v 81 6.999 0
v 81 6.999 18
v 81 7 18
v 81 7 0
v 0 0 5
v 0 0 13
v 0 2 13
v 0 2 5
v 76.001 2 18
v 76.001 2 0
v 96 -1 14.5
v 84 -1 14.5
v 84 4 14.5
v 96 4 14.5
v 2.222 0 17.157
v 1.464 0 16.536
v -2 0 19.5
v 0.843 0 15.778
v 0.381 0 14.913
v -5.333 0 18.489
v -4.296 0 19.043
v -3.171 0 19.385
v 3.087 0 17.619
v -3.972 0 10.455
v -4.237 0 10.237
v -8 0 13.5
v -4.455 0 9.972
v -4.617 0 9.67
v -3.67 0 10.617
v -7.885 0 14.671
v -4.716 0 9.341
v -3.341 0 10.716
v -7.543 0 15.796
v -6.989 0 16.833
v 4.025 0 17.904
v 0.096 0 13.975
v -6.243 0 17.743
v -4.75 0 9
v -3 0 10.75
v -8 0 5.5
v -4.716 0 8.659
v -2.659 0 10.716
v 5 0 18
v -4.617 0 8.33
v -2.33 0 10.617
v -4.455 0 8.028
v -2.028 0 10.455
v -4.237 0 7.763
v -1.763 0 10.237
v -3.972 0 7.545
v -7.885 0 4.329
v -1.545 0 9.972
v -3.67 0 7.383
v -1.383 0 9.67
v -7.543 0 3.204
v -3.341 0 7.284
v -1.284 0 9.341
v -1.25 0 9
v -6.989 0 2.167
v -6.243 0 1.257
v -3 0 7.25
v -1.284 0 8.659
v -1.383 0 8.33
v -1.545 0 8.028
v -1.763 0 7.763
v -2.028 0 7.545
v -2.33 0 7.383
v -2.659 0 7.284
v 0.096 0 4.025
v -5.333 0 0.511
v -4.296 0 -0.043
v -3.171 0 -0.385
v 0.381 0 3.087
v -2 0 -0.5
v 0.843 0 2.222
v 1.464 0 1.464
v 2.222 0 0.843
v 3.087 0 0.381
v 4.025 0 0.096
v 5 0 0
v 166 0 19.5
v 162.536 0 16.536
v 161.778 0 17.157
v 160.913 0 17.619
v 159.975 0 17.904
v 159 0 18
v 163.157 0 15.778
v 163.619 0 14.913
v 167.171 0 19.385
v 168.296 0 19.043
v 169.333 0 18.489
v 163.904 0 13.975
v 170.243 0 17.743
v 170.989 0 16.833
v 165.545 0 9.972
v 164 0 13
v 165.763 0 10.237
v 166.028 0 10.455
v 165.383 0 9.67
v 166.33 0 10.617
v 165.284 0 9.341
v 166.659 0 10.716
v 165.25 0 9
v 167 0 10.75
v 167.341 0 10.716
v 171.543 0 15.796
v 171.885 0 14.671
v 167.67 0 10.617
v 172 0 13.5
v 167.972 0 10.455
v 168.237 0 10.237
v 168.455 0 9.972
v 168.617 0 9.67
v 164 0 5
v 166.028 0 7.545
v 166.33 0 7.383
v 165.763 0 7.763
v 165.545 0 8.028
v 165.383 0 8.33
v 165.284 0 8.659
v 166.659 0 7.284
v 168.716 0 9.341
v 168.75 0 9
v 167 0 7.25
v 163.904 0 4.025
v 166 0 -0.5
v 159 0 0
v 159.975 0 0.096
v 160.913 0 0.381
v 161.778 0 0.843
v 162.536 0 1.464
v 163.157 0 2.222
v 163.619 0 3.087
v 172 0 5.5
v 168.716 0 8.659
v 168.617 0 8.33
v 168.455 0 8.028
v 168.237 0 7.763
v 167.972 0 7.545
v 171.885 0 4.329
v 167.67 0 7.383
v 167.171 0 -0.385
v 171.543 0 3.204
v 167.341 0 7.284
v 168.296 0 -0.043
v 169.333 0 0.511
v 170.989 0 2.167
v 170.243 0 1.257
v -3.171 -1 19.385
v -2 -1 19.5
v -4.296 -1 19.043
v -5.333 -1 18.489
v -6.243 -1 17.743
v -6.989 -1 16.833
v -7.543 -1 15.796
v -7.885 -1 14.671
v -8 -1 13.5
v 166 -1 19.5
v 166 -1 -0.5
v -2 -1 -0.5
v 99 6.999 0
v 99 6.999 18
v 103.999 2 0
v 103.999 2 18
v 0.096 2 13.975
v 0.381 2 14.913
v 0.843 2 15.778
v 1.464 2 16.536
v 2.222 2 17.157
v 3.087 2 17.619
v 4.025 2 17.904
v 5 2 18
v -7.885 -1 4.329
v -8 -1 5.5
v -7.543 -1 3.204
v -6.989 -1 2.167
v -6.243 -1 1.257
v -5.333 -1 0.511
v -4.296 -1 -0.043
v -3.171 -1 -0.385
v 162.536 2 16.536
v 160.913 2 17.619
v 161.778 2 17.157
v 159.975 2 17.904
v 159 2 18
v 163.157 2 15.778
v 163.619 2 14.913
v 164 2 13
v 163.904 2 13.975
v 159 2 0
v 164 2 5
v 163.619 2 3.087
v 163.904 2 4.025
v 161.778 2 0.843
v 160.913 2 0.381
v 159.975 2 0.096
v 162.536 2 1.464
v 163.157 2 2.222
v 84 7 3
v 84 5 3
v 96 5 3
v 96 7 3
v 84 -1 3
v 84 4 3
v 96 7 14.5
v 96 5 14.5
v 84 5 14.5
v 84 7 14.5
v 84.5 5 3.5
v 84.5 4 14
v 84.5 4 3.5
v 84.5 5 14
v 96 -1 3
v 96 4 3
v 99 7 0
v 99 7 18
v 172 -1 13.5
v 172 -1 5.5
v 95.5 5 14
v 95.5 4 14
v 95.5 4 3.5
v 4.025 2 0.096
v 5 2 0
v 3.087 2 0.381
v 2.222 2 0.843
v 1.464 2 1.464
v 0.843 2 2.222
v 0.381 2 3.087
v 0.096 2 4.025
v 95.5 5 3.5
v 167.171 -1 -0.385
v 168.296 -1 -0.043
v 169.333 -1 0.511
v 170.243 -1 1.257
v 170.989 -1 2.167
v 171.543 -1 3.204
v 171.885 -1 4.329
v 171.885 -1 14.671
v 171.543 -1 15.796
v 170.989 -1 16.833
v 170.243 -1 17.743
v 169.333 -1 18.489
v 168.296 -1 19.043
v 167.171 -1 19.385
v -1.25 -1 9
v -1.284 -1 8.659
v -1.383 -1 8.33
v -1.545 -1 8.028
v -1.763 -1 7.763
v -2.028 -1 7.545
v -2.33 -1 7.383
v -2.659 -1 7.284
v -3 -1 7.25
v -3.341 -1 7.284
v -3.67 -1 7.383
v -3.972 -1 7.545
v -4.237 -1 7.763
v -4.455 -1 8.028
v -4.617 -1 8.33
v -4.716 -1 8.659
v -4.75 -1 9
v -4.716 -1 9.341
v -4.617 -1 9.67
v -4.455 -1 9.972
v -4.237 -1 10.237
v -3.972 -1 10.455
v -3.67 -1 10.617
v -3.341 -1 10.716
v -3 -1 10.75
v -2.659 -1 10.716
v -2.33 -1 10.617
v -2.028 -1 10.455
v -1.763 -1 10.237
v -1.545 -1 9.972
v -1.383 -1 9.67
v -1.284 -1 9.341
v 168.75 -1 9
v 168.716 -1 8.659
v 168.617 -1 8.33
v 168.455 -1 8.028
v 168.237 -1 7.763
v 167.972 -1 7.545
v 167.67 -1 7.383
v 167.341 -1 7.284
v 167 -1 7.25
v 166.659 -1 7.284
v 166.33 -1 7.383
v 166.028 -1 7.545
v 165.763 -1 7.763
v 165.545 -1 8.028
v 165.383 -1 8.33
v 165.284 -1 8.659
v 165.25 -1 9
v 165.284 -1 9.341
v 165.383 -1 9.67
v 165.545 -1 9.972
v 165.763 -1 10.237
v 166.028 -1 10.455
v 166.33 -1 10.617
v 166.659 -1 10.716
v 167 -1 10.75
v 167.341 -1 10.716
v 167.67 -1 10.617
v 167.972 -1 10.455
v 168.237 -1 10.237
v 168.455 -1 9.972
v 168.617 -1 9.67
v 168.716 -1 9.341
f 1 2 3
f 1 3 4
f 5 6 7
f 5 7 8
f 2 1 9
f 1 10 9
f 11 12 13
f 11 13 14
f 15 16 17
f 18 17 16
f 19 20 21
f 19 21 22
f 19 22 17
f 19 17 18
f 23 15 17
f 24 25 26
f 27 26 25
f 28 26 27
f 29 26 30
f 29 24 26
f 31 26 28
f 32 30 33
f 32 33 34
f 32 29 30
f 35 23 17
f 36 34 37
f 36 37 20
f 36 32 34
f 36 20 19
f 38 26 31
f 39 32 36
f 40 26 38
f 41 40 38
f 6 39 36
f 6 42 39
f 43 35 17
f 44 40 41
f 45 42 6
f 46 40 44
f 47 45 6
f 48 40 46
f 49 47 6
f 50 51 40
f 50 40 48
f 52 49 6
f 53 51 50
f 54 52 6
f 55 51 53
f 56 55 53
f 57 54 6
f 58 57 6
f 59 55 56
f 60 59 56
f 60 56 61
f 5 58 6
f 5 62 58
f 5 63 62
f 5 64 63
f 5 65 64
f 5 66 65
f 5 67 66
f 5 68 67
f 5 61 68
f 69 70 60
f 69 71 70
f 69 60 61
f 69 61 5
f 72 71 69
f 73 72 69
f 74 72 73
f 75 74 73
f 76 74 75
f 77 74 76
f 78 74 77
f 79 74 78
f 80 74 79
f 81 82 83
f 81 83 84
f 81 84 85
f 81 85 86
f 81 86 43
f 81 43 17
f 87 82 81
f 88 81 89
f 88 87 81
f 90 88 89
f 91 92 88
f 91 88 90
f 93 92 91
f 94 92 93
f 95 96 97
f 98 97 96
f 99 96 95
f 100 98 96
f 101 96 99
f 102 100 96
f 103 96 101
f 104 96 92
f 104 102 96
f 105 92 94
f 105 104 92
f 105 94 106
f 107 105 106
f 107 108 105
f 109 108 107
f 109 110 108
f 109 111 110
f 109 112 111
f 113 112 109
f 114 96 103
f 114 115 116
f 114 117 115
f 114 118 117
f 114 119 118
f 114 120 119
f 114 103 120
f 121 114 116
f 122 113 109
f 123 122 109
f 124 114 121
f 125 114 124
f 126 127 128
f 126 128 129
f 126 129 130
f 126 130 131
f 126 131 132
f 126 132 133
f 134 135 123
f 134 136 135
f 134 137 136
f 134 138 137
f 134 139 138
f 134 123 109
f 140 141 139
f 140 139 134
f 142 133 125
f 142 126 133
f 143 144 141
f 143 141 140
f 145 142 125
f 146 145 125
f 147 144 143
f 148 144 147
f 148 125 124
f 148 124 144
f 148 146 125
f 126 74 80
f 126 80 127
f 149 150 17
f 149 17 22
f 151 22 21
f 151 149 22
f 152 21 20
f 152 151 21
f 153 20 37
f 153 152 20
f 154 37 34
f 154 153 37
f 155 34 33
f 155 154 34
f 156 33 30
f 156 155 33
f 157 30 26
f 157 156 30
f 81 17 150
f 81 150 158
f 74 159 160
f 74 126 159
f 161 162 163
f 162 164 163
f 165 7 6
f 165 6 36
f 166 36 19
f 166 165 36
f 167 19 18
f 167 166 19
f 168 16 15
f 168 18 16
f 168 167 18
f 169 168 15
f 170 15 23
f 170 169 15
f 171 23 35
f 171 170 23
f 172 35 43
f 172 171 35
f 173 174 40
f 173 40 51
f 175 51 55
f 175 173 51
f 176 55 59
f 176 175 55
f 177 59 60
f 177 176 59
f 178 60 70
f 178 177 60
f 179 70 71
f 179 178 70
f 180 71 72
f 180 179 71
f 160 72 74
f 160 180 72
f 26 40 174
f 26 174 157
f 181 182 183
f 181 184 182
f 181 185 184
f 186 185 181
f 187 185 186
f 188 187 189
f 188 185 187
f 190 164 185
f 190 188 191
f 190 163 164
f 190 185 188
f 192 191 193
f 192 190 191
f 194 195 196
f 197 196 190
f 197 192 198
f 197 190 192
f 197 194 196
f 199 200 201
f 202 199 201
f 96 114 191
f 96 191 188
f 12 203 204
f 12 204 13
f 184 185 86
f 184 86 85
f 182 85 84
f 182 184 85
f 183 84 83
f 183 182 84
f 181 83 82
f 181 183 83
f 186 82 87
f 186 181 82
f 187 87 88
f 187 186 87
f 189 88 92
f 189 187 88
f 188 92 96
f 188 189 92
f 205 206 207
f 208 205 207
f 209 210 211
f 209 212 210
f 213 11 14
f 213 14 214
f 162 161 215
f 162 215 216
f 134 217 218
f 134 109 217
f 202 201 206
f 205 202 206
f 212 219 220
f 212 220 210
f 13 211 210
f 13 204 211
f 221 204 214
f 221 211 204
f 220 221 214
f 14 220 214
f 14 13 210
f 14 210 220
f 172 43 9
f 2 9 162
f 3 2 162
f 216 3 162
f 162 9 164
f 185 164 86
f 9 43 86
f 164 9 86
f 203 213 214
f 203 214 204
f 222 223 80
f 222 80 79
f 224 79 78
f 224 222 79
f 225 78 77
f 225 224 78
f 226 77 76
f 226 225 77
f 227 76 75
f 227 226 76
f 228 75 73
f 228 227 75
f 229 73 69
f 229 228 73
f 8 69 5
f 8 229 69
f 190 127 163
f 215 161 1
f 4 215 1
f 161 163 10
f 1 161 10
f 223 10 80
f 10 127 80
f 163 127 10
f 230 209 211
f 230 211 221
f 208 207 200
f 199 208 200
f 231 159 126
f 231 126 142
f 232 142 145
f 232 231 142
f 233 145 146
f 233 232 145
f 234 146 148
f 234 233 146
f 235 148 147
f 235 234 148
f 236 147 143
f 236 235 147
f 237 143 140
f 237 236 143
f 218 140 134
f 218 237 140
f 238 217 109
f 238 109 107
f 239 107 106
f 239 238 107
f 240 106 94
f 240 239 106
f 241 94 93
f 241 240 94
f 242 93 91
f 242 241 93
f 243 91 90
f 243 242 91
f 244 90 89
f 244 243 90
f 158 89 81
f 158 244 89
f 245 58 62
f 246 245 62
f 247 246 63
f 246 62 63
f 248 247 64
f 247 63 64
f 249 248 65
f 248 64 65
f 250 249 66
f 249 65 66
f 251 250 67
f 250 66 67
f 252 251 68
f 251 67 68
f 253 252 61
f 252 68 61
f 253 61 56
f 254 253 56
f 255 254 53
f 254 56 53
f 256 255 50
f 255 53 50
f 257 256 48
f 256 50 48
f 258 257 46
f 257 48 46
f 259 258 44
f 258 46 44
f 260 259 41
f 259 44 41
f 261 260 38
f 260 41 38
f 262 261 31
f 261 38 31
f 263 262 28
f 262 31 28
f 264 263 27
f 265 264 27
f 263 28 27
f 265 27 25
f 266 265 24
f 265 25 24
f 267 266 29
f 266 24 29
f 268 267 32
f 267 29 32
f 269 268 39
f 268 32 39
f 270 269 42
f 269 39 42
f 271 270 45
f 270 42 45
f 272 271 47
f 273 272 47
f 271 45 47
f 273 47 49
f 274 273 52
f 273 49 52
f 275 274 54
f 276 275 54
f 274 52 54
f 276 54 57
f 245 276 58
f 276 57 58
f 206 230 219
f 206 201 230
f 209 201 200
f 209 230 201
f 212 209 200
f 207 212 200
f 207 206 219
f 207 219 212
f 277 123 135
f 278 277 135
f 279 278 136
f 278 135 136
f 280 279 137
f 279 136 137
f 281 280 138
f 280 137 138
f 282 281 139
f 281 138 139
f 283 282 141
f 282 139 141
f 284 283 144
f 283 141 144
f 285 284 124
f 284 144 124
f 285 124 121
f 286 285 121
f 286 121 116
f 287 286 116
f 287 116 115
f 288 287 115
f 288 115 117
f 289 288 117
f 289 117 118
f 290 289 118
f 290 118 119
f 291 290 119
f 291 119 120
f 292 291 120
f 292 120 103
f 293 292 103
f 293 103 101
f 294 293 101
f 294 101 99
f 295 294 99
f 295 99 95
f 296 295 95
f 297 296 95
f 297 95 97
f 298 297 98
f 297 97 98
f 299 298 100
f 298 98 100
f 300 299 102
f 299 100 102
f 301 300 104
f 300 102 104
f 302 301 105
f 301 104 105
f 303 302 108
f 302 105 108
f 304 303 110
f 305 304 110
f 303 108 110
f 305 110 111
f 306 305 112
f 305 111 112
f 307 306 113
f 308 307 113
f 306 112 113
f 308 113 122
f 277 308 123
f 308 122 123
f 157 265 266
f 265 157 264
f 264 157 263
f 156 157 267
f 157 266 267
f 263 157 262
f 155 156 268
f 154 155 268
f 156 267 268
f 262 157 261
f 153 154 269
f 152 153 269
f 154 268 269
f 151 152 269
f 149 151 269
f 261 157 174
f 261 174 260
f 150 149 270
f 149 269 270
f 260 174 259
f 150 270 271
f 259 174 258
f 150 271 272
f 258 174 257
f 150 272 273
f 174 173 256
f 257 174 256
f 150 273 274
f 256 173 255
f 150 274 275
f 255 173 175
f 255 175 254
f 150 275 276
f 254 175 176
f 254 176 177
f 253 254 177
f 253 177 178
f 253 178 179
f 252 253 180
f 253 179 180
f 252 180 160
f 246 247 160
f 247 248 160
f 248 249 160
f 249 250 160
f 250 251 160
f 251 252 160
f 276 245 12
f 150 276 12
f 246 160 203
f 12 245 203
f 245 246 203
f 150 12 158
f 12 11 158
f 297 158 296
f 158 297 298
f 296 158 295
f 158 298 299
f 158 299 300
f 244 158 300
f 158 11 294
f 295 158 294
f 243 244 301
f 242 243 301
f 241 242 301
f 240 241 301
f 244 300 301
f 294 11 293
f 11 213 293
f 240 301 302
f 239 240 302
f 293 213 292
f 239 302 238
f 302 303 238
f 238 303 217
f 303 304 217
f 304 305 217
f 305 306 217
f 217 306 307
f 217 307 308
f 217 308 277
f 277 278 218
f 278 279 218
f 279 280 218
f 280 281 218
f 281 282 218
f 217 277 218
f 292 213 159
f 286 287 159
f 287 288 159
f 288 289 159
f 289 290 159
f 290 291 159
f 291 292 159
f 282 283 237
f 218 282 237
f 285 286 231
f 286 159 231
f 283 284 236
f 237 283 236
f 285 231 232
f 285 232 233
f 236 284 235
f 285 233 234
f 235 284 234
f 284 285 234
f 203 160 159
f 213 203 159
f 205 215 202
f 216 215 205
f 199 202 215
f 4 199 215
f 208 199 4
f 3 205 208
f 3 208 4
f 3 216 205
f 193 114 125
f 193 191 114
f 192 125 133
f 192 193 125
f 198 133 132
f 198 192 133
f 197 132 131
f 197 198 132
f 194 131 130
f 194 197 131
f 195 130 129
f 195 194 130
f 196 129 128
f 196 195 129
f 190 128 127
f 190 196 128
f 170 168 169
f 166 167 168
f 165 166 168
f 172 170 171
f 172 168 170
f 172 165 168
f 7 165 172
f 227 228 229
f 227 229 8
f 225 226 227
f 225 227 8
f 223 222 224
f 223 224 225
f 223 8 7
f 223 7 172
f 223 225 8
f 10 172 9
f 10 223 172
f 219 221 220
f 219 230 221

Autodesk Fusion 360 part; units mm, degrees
sketch "Skizze1" plane through (0, 0, 0) normal (0, 1, 0) x (1, 0, 0)
  line L0 (0, 0) -> (164, 0)
  line L1 (164, 0) -> (164, -18)
  line L2 (164, -18) -> (0, -18)
  line L3 (0, -18) -> (0, 0)
  dimension "d1" = 18
  dimension "d2" = 164
extrude "Extrusion1" add sketch "Skizze1" along normal blind 8
fillet "Abrundung1" radius 5 4 edges at (0, 4, 18) (164, 4, 18) (0, 4, 0) (164, 4, 0)
sketch "Skizze2" plane through (0, 0, 0) normal (0, 1, 0) x (1, 0, 0)
  line L0 (-8, -19.5) -> (172, -19.5)
  line L1 (172, -19.5) -> (172, 0.5)
  line L2 (172, 0.5) -> (-8, 0.5)
  line L3 (-8, 0.5) -> (-8, -19.5)
  line L4 (-8, -9) -> (172, -9) construction
  circle A0 centre (-3, -9) radius 1.75
  circle A1 centre (167, -9) radius 1.75
  point P0 (0, -13)
  point P1 (164, -13)
  dimension "d7" = 0.5
  dimension "d8" = 19.5
  dimension "d9" = 9
  dimension "d10" = 3
  dimension "d11" = 3
  dimension "d12" = 3.5
  dimension "d13" = 5
  dimension "d14" = 5
extrude "Extrusion2" add sketch "Skizze2" against normal blind 1
fillet "Abrundung2" radius 6 4 edges at (172, -0.5, 19.5) (172, -0.5, -0.5) (-8, -0.5, 19.5) (-8, -0.5, -0.5)
extrude "Extrusion3" cut 1 faces at (56.3333, 8, 12) along direction (0, -1, 0) blind 6
sketch "Skizze3" plane through (0, 2, 0) normal (0, 1, 0) x (-1, 0, 0)
  arc A0 (-164, 5) -> (-159, 0) centre (-159, 5) ccw
  line L0 (-159, 0) -> (-5, 0)
  arc A1 (-5, 0) -> (0, 5) centre (-5, 5) ccw
  line L1 (0, 5) -> (0, 13)
  arc A2 (0, 13) -> (-5, 18) centre (-5, 13) ccw
  line L2 (-5, 18) -> (-159, 18)
  arc A3 (-159, 18) -> (-164, 13) centre (-159, 13) ccw
  line L3 (-164, 13) -> (-164, 5)
  line L4 (-96, 14.5) -> (-84, 14.5)
  line L5 (-84, 14.5) -> (-84, 3)
  line L6 (-84, 3) -> (-96, 3)
  line L7 (-96, 3) -> (-96, 14.5)
  dimension "d21" = 68
  dimension "d22" = 3
  dimension "d23" = 3.5
  dimension "d24" = 12
extrude "Extrusion4" add sketch "Skizze3" along normal blind 3 contours L4 L5 L6 L7
sketch "Skizze4" plane through (0, 2, 0) normal (0, 1, 0) x (-1, 0, 0)
  line L0 (-96, 3) -> (-96, 14.5)
  line L1 (-96, 14.5) -> (-84, 14.5)
  line L2 (-84, 14.5) -> (-84, 3)
  line L3 (-84, 3) -> (-96, 3)
  arc A0 (-164, 5) -> (-159, 0) centre (-159, 5) ccw
  line L4 (-159, 0) -> (-5, 0)
  arc A1 (-5, 0) -> (0, 5) centre (-5, 5) ccw
  line L5 (0, 5) -> (0, 13)
  arc A2 (0, 13) -> (-5, 18) centre (-5, 13) ccw
  line L6 (-5, 18) -> (-159, 18)
  arc A3 (-159, 18) -> (-164, 13) centre (-159, 13) ccw
  line L7 (-164, 13) -> (-164, 5)
  line L8 (-99, 18) -> (-81, 18)
  line L9 (-81, 18) -> (-81, 0)
  line L10 (-81, 0) -> (-99, 0)
  line L11 (-99, 0) -> (-99, 18)
  dimension "d27" = 3.5
  dimension "d28" = 3
  dimension "d29" = 3
  dimension "d30" = 3
extrude "Extrusion5" add sketch "Skizze4" along normal blind 5 contours L4 L6 L8 L9 L10 L11
sketch "Skizze5" plane through (0, 5, 0) normal (0, 1, 0) x (-1, 0, 0)
  line L0 (-96, 3) -> (-84, 3)
  line L1 (-84, 3) -> (-84, 14.5)
  line L2 (-84, 14.5) -> (-96, 14.5)
  line L3 (-96, 14.5) -> (-96, 3)
  line L4 (-95.5, 14) -> (-84.5, 14)
  line L5 (-84.5, 14) -> (-84.5, 3.5)
  line L6 (-84.5, 3.5) -> (-95.5, 3.5)
  line L7 (-95.5, 3.5) -> (-95.5, 14)
  dimension "d33" = 0.5
  dimension "d34" = 0.5
  dimension "d35" = 0.5
  dimension "d36" = 0.5
extrude "Extrusion6" cut sketch "Skizze5" against normal blind 13 contours L4 L5 L6 L7
sketch "Skizze6" plane through (0, -1, 0) normal (0, -1, 0) x (1, 0, 0)
  line L0 (84.5, 3.5) -> (84.5, 14)
  line L1 (84.5, 14) -> (95.5, 14)
  line L2 (95.5, 14) -> (95.5, 3.5)
  line L3 (95.5, 3.5) -> (84.5, 3.5)
  arc A0 (-8, 5.5) -> (-2, -0.5) centre (-2, 5.5) ccw
  line L4 (-2, -0.5) -> (166, -0.5)
  arc A1 (166, -0.5) -> (172, 5.5) centre (166, 5.5) ccw
  line L5 (172, 5.5) -> (172, 13.5)
  arc A2 (172, 13.5) -> (166, 19.5) centre (166, 13.5) ccw
  line L6 (166, 19.5) -> (-2, 19.5)
  arc A3 (-2, 19.5) -> (-8, 13.5) centre (-2, 13.5) ccw
  line L7 (-8, 13.5) -> (-8, 5.5)
  circle A4 centre (-3, 9) radius 1.75
  circle A5 centre (167, 9) radius 1.75
  line L8 (84, 14.5) -> (96, 14.5)
  line L9 (96, 14.5) -> (96, 3)
  line L10 (96, 3) -> (84, 3)
  line L11 (84, 3) -> (84, 14.5)
  dimension "d39" = 0.5
  dimension "d40" = 0.5
  dimension "d41" = 0.5
  dimension "d42" = 0.5
extrude "Extrusion7" cut sketch "Skizze6" against normal blind 5 contours L8 L9 L10 L11
chamfer "Fase1" distance 5 angle 45 2 edges at (99, 2, 9) (81, 2, 9)
